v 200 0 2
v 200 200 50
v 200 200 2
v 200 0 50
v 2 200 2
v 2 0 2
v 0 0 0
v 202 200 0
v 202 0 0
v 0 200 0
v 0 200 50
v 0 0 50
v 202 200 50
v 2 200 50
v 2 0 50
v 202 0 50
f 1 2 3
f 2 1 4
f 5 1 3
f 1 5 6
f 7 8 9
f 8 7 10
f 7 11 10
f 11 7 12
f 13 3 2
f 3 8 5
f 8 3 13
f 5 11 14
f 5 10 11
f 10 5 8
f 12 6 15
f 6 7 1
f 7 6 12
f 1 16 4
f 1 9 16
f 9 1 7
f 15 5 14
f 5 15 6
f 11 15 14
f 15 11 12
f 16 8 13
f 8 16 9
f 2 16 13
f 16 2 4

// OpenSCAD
width = 200;
length = 200;
thickness = 2;
height = 50;

cube([width, length, thickness]);


cube([thickness, length, height]);
translate([width, 0, 0]) cube([thickness, length, height]);
